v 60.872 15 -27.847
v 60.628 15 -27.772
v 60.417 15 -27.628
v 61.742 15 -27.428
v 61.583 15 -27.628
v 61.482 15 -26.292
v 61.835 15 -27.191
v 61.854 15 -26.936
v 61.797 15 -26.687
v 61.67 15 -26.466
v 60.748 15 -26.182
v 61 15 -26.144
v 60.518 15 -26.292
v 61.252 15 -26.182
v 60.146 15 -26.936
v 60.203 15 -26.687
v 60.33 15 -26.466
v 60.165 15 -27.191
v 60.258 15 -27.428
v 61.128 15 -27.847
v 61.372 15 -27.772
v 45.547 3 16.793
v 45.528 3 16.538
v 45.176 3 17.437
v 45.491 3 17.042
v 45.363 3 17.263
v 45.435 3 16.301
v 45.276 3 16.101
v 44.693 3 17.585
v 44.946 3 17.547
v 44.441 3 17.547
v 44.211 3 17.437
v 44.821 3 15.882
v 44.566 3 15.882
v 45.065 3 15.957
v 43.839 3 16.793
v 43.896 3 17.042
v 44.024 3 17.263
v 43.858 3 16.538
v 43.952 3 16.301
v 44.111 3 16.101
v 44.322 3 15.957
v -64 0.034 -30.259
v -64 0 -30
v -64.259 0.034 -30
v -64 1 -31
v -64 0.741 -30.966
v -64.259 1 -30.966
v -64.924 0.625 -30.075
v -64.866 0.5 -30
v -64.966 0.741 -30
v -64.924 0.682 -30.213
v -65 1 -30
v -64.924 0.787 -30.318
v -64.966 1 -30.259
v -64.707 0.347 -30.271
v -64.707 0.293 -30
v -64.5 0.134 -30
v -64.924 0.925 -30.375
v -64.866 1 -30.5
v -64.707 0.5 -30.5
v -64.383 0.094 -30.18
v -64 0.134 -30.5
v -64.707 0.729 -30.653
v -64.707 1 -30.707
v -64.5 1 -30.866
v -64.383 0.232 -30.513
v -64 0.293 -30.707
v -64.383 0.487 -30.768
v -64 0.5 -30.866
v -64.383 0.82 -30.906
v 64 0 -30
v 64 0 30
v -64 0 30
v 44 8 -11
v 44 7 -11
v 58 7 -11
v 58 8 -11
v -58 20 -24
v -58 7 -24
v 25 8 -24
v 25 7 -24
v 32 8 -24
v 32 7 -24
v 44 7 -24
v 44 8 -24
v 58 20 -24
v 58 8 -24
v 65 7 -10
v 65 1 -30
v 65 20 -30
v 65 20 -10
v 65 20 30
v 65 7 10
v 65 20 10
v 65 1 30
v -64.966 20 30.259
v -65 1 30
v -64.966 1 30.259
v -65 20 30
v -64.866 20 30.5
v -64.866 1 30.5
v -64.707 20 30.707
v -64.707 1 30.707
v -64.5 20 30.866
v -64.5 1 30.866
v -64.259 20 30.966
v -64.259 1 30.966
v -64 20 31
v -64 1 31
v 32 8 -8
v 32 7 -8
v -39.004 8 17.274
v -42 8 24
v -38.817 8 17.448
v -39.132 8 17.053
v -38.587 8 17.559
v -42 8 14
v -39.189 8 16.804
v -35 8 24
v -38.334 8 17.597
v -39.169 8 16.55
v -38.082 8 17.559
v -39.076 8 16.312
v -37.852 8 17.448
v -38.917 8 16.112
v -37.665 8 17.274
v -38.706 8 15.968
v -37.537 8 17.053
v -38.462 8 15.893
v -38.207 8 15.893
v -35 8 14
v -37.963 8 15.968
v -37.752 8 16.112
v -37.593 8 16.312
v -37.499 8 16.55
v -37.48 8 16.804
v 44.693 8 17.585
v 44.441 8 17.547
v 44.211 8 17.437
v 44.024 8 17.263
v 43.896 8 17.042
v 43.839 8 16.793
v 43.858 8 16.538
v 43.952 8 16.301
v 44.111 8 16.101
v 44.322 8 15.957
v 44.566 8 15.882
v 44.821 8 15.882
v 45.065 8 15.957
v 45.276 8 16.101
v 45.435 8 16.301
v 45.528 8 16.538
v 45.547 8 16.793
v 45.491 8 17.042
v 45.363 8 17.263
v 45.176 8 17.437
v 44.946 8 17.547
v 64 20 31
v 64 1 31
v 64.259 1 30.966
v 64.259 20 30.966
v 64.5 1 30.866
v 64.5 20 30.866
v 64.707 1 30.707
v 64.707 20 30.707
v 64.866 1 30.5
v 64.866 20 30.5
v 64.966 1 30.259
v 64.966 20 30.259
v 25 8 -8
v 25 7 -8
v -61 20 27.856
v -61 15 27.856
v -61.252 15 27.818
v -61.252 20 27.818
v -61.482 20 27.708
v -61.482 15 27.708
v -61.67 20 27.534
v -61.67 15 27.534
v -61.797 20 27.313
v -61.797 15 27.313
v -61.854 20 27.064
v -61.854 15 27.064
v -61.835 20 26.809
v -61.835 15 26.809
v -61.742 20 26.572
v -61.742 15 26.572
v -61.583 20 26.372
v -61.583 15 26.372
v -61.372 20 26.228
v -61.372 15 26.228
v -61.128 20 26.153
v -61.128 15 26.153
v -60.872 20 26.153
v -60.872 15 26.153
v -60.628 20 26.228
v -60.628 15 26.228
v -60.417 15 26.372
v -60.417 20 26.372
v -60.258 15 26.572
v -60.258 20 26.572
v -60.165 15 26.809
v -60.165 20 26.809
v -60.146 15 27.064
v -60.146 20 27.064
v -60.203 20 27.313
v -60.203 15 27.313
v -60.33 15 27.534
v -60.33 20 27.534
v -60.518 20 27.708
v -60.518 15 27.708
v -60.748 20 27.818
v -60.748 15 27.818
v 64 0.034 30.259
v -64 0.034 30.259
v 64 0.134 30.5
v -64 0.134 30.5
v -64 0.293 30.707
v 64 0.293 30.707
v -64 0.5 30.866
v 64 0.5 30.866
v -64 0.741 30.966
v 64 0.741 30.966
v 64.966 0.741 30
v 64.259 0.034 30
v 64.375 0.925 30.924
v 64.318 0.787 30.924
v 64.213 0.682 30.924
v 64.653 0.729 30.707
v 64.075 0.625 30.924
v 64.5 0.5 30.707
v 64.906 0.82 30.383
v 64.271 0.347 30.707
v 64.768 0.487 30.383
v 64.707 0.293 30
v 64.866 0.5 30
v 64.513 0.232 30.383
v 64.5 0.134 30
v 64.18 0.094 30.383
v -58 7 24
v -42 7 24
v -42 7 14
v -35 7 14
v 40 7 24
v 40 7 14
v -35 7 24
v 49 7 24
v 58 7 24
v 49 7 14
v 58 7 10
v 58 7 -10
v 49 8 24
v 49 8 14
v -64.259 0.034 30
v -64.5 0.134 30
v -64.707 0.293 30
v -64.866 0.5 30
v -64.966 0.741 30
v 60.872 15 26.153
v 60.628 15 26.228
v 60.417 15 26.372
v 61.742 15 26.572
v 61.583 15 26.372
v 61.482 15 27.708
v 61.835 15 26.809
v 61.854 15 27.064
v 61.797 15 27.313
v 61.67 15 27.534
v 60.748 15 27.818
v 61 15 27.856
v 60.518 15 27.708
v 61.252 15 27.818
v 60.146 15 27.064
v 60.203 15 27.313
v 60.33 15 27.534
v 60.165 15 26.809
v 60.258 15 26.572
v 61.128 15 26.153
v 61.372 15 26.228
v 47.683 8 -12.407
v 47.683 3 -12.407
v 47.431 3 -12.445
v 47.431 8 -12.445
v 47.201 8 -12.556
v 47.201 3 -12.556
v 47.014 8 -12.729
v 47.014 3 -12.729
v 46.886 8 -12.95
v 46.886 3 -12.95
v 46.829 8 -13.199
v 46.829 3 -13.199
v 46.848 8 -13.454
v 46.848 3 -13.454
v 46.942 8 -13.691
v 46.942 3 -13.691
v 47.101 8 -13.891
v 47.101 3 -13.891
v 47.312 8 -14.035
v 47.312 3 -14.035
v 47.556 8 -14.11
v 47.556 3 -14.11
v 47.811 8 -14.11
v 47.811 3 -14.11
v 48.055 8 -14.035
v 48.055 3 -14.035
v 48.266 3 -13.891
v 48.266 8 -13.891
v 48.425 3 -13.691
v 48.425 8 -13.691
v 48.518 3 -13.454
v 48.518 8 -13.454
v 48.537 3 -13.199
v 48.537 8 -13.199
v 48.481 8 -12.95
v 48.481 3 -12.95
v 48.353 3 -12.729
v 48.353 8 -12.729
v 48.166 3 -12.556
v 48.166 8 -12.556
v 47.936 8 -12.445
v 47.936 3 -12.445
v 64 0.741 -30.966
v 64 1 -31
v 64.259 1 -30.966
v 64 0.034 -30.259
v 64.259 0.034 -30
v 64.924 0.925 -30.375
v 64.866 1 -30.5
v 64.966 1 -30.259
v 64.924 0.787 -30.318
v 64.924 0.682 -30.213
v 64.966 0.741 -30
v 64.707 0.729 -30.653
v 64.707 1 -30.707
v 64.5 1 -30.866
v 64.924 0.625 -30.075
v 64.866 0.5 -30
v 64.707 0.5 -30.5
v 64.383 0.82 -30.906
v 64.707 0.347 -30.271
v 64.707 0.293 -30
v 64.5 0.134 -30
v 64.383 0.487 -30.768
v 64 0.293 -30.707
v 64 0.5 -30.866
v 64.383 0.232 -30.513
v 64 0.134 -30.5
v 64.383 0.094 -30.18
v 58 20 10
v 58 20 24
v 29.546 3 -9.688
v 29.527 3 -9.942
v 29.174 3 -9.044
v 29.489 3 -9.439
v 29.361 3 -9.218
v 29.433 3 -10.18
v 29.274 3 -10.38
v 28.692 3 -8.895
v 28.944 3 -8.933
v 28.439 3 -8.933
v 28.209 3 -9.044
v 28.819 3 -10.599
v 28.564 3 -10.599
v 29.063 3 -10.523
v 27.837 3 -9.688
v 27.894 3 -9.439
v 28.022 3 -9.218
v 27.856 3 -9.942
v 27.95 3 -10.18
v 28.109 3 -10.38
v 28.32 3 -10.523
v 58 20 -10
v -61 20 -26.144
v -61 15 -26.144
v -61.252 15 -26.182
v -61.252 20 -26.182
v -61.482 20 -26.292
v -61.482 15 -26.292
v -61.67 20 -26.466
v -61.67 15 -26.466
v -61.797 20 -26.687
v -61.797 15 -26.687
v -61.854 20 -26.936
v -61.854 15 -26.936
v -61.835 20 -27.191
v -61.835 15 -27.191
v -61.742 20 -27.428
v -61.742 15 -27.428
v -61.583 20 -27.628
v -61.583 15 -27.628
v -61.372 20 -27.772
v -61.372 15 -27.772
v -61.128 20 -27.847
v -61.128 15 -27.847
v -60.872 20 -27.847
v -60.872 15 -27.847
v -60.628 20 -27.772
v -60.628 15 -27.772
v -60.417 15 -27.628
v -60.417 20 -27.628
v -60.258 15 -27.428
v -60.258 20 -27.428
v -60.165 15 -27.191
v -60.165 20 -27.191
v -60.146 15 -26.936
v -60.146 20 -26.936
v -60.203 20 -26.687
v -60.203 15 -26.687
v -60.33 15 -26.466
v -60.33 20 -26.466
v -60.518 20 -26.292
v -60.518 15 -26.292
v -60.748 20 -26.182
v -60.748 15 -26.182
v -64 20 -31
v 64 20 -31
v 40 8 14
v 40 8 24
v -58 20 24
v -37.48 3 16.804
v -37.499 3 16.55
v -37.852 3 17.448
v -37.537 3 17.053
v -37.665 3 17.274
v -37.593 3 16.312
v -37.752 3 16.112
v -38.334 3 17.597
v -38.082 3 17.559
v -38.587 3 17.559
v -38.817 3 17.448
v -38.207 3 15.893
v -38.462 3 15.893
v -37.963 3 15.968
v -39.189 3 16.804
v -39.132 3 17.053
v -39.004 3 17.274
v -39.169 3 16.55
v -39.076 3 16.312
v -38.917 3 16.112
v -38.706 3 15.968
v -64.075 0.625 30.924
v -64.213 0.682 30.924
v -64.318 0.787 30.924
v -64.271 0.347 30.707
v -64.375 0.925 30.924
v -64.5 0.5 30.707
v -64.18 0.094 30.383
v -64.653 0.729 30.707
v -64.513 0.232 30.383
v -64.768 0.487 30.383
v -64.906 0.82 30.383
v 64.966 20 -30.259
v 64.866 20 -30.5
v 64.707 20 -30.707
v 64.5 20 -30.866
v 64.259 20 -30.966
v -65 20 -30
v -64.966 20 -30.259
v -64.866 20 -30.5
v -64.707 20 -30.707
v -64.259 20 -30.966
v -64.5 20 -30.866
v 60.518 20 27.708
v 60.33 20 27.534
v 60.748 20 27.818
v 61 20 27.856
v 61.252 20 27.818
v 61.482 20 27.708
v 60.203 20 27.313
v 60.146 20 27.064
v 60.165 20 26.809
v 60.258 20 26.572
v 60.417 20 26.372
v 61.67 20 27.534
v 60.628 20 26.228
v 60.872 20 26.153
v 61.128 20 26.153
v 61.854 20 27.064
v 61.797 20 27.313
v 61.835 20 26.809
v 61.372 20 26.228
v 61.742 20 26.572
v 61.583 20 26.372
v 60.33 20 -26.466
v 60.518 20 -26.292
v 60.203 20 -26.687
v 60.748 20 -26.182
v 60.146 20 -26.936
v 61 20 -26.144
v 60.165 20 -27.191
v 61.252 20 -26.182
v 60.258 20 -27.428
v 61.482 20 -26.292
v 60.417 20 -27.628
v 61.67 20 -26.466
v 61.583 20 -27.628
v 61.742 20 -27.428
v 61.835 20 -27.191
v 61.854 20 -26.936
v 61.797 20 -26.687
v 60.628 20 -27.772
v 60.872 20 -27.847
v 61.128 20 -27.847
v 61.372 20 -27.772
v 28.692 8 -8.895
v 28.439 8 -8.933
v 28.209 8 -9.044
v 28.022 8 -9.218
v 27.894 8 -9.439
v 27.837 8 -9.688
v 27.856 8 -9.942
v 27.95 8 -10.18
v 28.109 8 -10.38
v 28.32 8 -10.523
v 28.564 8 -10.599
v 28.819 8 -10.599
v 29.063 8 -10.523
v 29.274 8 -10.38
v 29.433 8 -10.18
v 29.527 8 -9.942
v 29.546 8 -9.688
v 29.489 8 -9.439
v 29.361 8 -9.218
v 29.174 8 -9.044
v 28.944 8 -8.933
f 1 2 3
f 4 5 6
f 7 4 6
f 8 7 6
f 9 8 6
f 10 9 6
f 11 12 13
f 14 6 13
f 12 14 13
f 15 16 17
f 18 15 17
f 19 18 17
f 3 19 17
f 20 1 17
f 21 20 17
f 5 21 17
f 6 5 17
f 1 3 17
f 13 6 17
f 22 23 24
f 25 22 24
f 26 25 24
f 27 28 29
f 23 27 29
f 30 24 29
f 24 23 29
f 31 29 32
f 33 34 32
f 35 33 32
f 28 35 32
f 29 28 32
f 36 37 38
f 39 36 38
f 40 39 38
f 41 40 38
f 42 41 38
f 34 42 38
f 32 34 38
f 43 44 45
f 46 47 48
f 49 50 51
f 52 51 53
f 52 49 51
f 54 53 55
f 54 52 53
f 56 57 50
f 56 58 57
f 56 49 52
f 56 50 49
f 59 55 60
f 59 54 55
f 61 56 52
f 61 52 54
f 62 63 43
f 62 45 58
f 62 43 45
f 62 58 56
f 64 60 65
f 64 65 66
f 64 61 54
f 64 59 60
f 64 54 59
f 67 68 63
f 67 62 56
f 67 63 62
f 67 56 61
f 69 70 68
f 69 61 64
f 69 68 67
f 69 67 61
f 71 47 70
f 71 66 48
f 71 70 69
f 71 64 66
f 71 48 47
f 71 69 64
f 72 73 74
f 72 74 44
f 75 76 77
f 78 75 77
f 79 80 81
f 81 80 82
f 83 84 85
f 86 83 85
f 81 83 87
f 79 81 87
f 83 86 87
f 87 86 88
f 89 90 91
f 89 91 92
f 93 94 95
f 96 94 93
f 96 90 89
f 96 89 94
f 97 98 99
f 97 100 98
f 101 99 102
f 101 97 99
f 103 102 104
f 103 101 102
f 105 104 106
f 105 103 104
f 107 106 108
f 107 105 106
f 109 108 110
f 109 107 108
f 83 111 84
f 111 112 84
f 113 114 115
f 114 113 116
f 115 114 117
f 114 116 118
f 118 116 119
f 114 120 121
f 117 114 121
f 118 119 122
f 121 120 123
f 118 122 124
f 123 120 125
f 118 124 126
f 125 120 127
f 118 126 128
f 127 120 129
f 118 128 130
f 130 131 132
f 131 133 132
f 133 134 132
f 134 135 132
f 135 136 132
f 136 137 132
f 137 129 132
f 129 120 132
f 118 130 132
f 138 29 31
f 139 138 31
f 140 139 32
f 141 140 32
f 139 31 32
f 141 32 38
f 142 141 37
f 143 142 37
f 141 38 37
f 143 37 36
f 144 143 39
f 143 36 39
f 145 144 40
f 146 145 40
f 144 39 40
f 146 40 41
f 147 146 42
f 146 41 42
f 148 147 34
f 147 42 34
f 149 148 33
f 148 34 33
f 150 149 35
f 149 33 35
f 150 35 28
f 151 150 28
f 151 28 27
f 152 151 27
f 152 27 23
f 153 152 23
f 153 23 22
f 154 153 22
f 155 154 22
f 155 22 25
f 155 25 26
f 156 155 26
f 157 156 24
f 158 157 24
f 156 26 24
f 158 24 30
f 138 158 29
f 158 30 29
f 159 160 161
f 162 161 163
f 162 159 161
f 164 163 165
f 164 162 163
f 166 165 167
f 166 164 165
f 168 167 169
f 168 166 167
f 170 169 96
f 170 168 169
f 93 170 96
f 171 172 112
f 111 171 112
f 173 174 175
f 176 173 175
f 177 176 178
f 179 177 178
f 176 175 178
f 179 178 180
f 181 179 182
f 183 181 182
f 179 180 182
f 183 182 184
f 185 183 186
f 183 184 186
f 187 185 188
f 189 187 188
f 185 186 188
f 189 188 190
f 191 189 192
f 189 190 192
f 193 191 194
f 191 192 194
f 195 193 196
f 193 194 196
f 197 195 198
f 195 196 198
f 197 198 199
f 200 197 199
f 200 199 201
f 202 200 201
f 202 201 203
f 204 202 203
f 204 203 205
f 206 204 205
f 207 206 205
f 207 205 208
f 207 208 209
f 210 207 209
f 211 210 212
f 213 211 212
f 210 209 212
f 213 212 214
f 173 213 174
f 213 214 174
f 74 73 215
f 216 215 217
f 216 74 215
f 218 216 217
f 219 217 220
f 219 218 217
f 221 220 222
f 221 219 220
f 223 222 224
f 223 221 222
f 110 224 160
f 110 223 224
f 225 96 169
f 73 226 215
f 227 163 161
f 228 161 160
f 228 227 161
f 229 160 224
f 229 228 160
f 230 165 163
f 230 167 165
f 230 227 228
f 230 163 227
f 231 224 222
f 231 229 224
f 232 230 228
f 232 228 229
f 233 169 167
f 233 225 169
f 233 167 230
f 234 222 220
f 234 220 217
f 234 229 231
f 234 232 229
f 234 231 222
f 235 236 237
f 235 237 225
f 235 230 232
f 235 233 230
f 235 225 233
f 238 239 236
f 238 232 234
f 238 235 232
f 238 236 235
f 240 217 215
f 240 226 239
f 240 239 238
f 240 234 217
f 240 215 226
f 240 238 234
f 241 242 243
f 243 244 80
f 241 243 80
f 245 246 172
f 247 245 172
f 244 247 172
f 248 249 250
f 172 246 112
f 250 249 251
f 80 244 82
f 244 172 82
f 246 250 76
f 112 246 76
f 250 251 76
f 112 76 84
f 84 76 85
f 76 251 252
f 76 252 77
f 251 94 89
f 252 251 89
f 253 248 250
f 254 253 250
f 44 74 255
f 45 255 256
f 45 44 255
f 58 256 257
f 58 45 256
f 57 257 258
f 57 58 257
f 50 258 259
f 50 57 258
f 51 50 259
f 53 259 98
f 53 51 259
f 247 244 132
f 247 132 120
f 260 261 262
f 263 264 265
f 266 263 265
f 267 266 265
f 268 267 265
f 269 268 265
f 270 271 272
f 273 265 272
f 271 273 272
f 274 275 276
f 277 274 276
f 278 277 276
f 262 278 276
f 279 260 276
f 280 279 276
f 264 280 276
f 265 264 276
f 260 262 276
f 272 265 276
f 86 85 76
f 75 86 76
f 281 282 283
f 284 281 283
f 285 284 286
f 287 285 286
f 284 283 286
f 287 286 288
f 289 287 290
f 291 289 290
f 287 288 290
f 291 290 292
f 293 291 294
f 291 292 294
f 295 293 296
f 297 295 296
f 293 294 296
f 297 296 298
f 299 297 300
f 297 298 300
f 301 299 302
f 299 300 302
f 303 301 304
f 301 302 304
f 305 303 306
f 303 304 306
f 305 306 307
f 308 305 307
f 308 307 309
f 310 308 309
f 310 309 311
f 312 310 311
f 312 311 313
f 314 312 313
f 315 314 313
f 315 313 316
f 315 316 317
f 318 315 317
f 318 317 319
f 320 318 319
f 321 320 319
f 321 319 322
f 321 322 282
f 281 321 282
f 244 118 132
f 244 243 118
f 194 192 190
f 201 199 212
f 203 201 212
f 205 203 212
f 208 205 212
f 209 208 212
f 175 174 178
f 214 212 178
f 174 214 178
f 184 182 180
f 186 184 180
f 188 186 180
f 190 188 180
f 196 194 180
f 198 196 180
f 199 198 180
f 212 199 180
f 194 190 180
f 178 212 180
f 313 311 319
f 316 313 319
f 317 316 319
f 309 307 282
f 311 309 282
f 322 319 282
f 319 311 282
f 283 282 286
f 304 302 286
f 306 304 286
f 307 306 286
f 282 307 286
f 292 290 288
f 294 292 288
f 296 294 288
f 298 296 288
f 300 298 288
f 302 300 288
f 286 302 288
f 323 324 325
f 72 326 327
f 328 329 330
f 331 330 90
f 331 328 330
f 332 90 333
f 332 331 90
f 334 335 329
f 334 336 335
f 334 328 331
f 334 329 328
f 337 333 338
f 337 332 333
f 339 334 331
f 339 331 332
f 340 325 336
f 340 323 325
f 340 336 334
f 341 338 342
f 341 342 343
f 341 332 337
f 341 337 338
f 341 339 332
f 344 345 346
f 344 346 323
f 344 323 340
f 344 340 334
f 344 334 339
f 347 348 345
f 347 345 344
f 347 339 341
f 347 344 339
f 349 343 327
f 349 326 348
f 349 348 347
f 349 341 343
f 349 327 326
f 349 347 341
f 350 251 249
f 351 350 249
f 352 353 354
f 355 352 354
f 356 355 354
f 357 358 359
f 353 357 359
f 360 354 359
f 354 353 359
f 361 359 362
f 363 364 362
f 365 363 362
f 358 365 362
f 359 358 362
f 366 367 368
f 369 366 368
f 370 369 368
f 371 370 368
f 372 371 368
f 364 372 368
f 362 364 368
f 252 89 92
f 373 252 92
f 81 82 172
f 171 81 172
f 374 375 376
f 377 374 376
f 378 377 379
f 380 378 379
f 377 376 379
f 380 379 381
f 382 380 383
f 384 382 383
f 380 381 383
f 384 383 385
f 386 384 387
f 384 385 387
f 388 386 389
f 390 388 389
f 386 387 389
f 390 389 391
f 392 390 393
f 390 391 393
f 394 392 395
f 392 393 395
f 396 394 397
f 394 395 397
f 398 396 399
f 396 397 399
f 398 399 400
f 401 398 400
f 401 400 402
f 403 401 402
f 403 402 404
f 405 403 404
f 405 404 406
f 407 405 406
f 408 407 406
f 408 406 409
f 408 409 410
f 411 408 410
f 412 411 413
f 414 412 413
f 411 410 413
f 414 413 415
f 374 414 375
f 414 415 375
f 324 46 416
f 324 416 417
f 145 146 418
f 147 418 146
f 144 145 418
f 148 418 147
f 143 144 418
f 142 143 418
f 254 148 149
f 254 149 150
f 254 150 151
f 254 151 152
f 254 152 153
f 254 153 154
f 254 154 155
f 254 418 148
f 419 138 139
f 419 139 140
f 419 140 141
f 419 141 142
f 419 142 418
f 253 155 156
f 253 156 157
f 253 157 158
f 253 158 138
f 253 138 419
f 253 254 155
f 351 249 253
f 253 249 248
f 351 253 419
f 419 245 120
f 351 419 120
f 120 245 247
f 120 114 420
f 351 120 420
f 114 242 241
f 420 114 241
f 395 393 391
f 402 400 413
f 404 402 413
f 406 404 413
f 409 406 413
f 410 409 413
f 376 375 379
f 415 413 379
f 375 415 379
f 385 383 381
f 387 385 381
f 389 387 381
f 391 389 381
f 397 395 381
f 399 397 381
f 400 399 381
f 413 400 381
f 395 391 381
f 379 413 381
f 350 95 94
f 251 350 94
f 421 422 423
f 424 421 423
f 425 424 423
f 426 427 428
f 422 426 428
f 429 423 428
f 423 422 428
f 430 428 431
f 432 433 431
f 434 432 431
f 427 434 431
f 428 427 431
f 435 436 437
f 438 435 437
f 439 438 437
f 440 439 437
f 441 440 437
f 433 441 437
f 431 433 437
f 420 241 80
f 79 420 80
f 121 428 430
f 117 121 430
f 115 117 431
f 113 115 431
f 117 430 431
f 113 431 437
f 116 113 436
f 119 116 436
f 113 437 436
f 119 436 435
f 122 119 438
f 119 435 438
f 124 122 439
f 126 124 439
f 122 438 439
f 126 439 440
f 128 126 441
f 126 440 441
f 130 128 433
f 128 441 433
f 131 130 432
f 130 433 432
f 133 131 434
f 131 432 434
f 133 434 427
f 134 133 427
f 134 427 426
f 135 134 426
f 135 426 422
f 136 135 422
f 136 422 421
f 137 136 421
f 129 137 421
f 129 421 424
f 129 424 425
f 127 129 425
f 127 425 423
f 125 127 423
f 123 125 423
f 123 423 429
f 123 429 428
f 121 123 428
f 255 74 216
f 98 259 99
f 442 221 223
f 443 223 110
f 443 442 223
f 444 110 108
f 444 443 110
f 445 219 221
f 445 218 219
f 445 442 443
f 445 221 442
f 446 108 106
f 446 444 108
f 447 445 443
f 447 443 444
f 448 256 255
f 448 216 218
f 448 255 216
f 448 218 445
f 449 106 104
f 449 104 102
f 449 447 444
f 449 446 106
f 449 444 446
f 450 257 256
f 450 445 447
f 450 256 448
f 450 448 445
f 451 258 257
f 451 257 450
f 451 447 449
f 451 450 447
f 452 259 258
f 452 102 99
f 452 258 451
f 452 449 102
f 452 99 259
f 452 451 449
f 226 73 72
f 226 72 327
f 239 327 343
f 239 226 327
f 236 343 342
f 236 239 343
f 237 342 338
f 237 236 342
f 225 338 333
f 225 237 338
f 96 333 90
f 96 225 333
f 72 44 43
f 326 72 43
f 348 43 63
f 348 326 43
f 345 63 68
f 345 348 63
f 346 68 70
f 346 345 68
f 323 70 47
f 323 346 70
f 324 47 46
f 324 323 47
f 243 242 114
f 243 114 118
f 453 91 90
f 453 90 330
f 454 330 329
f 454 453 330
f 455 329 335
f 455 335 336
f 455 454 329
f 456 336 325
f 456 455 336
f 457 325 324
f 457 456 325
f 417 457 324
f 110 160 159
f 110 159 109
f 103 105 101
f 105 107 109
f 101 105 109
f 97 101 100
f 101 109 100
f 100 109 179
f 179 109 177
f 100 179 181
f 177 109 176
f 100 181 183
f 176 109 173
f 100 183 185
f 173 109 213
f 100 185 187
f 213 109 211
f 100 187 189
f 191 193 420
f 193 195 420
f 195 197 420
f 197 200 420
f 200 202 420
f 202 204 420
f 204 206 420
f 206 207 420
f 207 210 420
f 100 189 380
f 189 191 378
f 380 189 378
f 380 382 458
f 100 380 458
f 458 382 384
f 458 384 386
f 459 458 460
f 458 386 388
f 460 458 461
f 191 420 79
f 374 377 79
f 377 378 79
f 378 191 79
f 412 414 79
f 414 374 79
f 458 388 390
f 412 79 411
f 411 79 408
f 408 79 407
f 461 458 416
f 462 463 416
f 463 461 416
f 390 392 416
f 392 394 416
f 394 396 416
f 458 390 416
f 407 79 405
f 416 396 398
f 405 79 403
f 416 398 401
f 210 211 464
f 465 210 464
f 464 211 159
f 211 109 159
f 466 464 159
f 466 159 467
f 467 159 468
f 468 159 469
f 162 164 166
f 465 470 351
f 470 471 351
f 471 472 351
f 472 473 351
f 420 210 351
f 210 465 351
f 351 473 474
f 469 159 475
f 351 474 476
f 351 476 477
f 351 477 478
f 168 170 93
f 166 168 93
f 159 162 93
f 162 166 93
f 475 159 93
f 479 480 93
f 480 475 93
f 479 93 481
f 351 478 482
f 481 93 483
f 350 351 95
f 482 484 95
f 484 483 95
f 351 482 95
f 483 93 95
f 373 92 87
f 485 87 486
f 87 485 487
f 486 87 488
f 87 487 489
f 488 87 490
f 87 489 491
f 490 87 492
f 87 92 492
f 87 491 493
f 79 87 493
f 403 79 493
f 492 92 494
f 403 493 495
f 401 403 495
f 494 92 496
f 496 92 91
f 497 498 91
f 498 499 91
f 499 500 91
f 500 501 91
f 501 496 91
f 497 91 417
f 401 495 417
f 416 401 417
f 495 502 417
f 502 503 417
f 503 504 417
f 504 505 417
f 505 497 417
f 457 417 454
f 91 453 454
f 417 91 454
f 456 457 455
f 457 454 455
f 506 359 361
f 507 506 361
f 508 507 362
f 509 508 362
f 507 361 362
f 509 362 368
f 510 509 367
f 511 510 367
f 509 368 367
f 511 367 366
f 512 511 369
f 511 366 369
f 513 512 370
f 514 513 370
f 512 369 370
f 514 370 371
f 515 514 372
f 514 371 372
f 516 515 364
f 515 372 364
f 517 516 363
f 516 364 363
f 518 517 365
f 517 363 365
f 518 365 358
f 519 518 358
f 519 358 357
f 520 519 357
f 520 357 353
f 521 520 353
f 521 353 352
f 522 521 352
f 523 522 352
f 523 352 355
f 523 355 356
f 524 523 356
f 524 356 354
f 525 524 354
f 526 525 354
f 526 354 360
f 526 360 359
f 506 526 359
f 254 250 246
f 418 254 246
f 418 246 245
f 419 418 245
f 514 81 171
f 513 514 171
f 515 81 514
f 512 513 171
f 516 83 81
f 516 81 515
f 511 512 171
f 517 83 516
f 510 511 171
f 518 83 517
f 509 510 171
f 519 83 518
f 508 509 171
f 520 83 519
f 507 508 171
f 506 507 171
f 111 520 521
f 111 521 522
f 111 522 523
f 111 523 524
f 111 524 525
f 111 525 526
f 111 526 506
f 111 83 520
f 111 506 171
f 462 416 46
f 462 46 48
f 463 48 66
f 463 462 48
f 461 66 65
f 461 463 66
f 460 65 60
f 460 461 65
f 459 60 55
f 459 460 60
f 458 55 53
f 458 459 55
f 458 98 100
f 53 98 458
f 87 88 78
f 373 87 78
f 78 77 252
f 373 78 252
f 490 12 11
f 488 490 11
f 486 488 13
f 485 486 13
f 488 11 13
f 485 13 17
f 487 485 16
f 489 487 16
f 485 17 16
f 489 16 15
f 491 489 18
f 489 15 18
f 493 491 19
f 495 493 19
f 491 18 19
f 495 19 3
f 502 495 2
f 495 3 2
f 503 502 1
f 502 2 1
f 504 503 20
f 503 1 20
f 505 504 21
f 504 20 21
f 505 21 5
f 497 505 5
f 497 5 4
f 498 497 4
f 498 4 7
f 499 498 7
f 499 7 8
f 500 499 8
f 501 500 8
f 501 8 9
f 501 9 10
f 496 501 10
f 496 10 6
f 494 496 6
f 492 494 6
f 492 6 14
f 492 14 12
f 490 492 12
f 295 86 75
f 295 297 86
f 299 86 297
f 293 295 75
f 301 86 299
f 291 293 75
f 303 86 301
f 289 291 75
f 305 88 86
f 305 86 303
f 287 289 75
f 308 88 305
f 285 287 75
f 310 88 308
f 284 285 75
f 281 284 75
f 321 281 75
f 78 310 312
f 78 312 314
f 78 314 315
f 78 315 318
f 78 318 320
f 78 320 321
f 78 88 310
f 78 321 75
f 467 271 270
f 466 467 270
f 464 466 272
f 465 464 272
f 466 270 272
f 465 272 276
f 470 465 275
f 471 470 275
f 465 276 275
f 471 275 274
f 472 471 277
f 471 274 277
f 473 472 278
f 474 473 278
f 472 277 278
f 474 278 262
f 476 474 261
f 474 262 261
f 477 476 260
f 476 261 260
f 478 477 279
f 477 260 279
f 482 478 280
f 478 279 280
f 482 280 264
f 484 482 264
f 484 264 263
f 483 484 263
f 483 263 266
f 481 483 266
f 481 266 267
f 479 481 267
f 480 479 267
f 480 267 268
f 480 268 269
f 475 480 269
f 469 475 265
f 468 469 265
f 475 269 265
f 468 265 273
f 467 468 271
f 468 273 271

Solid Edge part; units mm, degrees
sketch "Sketch1" plane through (0, 0, 0) normal (0, -1, 0) x (1, 0, 0)
  line L0 (-65, -31) -> (65, -31)
  line L1 (65, -31) -> (65, 31)
  line L2 (65, 31) -> (-65, 31)
  line L3 (-65, 31) -> (-65, -31)
extrude "Ajout_matière_1" add sketch "Sketch1" against normal blind 20
shell "Coque_1" thickness 7 removed faces 1 at (-42.0333, 20, 21.2867)
fillet "Congé_1" radius 1 8 edges at (0, 0, -31) (65, 0, 0) (65, 10, -31) (-65, 10, -31) (-65, 0, 0) (-65, 10, 31) (0, 0, 31) (65, 10, 31)
sketch "Sketch2" plane through (65, 13, 0) normal (1, 0, 0) x (0, 0, -1)
  line L0 (-10, -6) -> (10, -6)
  line L1 (10, -6) -> (10, 7)
  line L2 (10, 7) -> (-10, 7)
  line L3 (-10, 7) -> (-10, -6)
  dimension "D1" = 7
extrude "Cutout1" cut sketch "Sketch2" against normal up to vertex (18.3022 mm away)
sketch "Sketch3" plane through (3.5, 7, 0) normal (0, 1, 0) x (0, 0, -1)
  line L0 (24, -40.5) -> (11, -40.5)
  line L1 (11, -40.5) -> (11, -54.5)
  line L2 (11, -54.5) -> (24, -54.5)
  line L3 (24, -54.5) -> (24, -40.5)
  line L4 (-24, 45.5) -> (-14, 45.5)
  line L5 (-14, 45.5) -> (-14, 38.5)
  line L6 (-14, 38.5) -> (-24, 38.5)
  line L7 (-24, 38.5) -> (-24, 45.5)
  line L8 (24, -21.5) -> (8, -21.5)
  line L9 (8, -21.5) -> (8, -28.5)
  line L10 (8, -28.5) -> (24, -28.5)
  line L11 (24, -28.5) -> (24, -21.5)
  line L12 (-24, -45.5) -> (-14, -45.5)
  line L13 (-14, -45.5) -> (-14, -36.5)
  line L14 (-14, -36.5) -> (-24, -36.5)
  line L15 (-24, -36.5) -> (-24, -45.5)
  dimension "D1" = 10
  dimension "D2" = 9
  dimension "D3" = 9
  dimension "D4" = 93
  dimension "D5" = 7
  dimension "D6" = 10
  dimension "D7" = 26
  dimension "D8" = 13
  dimension "D9" = 14
  dimension "D10" = 16
  dimension "D11" = 7
extrude "Ajout_matière_2" add sketch "Sketch3" along normal blind 1
hole "Perçage_1" at (61, 20, -27) direction (0, -1, 0) diameter 1.713 depth 5 thread major 2.2 thread length 2
hole "Hole1" at (61, 20, 27) direction (0, -1, 0) diameter 1.713 depth 5 thread major 2.2 thread length 2
hole "Hole2" at (-61, 20, -27) direction (0, -1, 0) diameter 1.713 depth 5 thread major 2.2 thread length 2
hole "Hole3" at (-61, 20, 27) direction (0, -1, 0) diameter 1.713 depth 5 thread major 2.2 thread length 2
hole "Perçage_5" at (-38.3344, 8, 16.7401) direction (0, -1, 0) diameter 1.713 depth 5
hole "Hole4" at (28.6915, 8, -9.7518) direction (0, -1, 0) diameter 1.713 depth 5
hole "Hole5" at (47.6833, 8, -13.2632) direction (0, -1, 0) diameter 1.713 depth 5
hole "Hole6" at (44.6933, 8, 16.7289) direction (0, -1, 0) diameter 1.713 depth 5
properties material "Pin"
